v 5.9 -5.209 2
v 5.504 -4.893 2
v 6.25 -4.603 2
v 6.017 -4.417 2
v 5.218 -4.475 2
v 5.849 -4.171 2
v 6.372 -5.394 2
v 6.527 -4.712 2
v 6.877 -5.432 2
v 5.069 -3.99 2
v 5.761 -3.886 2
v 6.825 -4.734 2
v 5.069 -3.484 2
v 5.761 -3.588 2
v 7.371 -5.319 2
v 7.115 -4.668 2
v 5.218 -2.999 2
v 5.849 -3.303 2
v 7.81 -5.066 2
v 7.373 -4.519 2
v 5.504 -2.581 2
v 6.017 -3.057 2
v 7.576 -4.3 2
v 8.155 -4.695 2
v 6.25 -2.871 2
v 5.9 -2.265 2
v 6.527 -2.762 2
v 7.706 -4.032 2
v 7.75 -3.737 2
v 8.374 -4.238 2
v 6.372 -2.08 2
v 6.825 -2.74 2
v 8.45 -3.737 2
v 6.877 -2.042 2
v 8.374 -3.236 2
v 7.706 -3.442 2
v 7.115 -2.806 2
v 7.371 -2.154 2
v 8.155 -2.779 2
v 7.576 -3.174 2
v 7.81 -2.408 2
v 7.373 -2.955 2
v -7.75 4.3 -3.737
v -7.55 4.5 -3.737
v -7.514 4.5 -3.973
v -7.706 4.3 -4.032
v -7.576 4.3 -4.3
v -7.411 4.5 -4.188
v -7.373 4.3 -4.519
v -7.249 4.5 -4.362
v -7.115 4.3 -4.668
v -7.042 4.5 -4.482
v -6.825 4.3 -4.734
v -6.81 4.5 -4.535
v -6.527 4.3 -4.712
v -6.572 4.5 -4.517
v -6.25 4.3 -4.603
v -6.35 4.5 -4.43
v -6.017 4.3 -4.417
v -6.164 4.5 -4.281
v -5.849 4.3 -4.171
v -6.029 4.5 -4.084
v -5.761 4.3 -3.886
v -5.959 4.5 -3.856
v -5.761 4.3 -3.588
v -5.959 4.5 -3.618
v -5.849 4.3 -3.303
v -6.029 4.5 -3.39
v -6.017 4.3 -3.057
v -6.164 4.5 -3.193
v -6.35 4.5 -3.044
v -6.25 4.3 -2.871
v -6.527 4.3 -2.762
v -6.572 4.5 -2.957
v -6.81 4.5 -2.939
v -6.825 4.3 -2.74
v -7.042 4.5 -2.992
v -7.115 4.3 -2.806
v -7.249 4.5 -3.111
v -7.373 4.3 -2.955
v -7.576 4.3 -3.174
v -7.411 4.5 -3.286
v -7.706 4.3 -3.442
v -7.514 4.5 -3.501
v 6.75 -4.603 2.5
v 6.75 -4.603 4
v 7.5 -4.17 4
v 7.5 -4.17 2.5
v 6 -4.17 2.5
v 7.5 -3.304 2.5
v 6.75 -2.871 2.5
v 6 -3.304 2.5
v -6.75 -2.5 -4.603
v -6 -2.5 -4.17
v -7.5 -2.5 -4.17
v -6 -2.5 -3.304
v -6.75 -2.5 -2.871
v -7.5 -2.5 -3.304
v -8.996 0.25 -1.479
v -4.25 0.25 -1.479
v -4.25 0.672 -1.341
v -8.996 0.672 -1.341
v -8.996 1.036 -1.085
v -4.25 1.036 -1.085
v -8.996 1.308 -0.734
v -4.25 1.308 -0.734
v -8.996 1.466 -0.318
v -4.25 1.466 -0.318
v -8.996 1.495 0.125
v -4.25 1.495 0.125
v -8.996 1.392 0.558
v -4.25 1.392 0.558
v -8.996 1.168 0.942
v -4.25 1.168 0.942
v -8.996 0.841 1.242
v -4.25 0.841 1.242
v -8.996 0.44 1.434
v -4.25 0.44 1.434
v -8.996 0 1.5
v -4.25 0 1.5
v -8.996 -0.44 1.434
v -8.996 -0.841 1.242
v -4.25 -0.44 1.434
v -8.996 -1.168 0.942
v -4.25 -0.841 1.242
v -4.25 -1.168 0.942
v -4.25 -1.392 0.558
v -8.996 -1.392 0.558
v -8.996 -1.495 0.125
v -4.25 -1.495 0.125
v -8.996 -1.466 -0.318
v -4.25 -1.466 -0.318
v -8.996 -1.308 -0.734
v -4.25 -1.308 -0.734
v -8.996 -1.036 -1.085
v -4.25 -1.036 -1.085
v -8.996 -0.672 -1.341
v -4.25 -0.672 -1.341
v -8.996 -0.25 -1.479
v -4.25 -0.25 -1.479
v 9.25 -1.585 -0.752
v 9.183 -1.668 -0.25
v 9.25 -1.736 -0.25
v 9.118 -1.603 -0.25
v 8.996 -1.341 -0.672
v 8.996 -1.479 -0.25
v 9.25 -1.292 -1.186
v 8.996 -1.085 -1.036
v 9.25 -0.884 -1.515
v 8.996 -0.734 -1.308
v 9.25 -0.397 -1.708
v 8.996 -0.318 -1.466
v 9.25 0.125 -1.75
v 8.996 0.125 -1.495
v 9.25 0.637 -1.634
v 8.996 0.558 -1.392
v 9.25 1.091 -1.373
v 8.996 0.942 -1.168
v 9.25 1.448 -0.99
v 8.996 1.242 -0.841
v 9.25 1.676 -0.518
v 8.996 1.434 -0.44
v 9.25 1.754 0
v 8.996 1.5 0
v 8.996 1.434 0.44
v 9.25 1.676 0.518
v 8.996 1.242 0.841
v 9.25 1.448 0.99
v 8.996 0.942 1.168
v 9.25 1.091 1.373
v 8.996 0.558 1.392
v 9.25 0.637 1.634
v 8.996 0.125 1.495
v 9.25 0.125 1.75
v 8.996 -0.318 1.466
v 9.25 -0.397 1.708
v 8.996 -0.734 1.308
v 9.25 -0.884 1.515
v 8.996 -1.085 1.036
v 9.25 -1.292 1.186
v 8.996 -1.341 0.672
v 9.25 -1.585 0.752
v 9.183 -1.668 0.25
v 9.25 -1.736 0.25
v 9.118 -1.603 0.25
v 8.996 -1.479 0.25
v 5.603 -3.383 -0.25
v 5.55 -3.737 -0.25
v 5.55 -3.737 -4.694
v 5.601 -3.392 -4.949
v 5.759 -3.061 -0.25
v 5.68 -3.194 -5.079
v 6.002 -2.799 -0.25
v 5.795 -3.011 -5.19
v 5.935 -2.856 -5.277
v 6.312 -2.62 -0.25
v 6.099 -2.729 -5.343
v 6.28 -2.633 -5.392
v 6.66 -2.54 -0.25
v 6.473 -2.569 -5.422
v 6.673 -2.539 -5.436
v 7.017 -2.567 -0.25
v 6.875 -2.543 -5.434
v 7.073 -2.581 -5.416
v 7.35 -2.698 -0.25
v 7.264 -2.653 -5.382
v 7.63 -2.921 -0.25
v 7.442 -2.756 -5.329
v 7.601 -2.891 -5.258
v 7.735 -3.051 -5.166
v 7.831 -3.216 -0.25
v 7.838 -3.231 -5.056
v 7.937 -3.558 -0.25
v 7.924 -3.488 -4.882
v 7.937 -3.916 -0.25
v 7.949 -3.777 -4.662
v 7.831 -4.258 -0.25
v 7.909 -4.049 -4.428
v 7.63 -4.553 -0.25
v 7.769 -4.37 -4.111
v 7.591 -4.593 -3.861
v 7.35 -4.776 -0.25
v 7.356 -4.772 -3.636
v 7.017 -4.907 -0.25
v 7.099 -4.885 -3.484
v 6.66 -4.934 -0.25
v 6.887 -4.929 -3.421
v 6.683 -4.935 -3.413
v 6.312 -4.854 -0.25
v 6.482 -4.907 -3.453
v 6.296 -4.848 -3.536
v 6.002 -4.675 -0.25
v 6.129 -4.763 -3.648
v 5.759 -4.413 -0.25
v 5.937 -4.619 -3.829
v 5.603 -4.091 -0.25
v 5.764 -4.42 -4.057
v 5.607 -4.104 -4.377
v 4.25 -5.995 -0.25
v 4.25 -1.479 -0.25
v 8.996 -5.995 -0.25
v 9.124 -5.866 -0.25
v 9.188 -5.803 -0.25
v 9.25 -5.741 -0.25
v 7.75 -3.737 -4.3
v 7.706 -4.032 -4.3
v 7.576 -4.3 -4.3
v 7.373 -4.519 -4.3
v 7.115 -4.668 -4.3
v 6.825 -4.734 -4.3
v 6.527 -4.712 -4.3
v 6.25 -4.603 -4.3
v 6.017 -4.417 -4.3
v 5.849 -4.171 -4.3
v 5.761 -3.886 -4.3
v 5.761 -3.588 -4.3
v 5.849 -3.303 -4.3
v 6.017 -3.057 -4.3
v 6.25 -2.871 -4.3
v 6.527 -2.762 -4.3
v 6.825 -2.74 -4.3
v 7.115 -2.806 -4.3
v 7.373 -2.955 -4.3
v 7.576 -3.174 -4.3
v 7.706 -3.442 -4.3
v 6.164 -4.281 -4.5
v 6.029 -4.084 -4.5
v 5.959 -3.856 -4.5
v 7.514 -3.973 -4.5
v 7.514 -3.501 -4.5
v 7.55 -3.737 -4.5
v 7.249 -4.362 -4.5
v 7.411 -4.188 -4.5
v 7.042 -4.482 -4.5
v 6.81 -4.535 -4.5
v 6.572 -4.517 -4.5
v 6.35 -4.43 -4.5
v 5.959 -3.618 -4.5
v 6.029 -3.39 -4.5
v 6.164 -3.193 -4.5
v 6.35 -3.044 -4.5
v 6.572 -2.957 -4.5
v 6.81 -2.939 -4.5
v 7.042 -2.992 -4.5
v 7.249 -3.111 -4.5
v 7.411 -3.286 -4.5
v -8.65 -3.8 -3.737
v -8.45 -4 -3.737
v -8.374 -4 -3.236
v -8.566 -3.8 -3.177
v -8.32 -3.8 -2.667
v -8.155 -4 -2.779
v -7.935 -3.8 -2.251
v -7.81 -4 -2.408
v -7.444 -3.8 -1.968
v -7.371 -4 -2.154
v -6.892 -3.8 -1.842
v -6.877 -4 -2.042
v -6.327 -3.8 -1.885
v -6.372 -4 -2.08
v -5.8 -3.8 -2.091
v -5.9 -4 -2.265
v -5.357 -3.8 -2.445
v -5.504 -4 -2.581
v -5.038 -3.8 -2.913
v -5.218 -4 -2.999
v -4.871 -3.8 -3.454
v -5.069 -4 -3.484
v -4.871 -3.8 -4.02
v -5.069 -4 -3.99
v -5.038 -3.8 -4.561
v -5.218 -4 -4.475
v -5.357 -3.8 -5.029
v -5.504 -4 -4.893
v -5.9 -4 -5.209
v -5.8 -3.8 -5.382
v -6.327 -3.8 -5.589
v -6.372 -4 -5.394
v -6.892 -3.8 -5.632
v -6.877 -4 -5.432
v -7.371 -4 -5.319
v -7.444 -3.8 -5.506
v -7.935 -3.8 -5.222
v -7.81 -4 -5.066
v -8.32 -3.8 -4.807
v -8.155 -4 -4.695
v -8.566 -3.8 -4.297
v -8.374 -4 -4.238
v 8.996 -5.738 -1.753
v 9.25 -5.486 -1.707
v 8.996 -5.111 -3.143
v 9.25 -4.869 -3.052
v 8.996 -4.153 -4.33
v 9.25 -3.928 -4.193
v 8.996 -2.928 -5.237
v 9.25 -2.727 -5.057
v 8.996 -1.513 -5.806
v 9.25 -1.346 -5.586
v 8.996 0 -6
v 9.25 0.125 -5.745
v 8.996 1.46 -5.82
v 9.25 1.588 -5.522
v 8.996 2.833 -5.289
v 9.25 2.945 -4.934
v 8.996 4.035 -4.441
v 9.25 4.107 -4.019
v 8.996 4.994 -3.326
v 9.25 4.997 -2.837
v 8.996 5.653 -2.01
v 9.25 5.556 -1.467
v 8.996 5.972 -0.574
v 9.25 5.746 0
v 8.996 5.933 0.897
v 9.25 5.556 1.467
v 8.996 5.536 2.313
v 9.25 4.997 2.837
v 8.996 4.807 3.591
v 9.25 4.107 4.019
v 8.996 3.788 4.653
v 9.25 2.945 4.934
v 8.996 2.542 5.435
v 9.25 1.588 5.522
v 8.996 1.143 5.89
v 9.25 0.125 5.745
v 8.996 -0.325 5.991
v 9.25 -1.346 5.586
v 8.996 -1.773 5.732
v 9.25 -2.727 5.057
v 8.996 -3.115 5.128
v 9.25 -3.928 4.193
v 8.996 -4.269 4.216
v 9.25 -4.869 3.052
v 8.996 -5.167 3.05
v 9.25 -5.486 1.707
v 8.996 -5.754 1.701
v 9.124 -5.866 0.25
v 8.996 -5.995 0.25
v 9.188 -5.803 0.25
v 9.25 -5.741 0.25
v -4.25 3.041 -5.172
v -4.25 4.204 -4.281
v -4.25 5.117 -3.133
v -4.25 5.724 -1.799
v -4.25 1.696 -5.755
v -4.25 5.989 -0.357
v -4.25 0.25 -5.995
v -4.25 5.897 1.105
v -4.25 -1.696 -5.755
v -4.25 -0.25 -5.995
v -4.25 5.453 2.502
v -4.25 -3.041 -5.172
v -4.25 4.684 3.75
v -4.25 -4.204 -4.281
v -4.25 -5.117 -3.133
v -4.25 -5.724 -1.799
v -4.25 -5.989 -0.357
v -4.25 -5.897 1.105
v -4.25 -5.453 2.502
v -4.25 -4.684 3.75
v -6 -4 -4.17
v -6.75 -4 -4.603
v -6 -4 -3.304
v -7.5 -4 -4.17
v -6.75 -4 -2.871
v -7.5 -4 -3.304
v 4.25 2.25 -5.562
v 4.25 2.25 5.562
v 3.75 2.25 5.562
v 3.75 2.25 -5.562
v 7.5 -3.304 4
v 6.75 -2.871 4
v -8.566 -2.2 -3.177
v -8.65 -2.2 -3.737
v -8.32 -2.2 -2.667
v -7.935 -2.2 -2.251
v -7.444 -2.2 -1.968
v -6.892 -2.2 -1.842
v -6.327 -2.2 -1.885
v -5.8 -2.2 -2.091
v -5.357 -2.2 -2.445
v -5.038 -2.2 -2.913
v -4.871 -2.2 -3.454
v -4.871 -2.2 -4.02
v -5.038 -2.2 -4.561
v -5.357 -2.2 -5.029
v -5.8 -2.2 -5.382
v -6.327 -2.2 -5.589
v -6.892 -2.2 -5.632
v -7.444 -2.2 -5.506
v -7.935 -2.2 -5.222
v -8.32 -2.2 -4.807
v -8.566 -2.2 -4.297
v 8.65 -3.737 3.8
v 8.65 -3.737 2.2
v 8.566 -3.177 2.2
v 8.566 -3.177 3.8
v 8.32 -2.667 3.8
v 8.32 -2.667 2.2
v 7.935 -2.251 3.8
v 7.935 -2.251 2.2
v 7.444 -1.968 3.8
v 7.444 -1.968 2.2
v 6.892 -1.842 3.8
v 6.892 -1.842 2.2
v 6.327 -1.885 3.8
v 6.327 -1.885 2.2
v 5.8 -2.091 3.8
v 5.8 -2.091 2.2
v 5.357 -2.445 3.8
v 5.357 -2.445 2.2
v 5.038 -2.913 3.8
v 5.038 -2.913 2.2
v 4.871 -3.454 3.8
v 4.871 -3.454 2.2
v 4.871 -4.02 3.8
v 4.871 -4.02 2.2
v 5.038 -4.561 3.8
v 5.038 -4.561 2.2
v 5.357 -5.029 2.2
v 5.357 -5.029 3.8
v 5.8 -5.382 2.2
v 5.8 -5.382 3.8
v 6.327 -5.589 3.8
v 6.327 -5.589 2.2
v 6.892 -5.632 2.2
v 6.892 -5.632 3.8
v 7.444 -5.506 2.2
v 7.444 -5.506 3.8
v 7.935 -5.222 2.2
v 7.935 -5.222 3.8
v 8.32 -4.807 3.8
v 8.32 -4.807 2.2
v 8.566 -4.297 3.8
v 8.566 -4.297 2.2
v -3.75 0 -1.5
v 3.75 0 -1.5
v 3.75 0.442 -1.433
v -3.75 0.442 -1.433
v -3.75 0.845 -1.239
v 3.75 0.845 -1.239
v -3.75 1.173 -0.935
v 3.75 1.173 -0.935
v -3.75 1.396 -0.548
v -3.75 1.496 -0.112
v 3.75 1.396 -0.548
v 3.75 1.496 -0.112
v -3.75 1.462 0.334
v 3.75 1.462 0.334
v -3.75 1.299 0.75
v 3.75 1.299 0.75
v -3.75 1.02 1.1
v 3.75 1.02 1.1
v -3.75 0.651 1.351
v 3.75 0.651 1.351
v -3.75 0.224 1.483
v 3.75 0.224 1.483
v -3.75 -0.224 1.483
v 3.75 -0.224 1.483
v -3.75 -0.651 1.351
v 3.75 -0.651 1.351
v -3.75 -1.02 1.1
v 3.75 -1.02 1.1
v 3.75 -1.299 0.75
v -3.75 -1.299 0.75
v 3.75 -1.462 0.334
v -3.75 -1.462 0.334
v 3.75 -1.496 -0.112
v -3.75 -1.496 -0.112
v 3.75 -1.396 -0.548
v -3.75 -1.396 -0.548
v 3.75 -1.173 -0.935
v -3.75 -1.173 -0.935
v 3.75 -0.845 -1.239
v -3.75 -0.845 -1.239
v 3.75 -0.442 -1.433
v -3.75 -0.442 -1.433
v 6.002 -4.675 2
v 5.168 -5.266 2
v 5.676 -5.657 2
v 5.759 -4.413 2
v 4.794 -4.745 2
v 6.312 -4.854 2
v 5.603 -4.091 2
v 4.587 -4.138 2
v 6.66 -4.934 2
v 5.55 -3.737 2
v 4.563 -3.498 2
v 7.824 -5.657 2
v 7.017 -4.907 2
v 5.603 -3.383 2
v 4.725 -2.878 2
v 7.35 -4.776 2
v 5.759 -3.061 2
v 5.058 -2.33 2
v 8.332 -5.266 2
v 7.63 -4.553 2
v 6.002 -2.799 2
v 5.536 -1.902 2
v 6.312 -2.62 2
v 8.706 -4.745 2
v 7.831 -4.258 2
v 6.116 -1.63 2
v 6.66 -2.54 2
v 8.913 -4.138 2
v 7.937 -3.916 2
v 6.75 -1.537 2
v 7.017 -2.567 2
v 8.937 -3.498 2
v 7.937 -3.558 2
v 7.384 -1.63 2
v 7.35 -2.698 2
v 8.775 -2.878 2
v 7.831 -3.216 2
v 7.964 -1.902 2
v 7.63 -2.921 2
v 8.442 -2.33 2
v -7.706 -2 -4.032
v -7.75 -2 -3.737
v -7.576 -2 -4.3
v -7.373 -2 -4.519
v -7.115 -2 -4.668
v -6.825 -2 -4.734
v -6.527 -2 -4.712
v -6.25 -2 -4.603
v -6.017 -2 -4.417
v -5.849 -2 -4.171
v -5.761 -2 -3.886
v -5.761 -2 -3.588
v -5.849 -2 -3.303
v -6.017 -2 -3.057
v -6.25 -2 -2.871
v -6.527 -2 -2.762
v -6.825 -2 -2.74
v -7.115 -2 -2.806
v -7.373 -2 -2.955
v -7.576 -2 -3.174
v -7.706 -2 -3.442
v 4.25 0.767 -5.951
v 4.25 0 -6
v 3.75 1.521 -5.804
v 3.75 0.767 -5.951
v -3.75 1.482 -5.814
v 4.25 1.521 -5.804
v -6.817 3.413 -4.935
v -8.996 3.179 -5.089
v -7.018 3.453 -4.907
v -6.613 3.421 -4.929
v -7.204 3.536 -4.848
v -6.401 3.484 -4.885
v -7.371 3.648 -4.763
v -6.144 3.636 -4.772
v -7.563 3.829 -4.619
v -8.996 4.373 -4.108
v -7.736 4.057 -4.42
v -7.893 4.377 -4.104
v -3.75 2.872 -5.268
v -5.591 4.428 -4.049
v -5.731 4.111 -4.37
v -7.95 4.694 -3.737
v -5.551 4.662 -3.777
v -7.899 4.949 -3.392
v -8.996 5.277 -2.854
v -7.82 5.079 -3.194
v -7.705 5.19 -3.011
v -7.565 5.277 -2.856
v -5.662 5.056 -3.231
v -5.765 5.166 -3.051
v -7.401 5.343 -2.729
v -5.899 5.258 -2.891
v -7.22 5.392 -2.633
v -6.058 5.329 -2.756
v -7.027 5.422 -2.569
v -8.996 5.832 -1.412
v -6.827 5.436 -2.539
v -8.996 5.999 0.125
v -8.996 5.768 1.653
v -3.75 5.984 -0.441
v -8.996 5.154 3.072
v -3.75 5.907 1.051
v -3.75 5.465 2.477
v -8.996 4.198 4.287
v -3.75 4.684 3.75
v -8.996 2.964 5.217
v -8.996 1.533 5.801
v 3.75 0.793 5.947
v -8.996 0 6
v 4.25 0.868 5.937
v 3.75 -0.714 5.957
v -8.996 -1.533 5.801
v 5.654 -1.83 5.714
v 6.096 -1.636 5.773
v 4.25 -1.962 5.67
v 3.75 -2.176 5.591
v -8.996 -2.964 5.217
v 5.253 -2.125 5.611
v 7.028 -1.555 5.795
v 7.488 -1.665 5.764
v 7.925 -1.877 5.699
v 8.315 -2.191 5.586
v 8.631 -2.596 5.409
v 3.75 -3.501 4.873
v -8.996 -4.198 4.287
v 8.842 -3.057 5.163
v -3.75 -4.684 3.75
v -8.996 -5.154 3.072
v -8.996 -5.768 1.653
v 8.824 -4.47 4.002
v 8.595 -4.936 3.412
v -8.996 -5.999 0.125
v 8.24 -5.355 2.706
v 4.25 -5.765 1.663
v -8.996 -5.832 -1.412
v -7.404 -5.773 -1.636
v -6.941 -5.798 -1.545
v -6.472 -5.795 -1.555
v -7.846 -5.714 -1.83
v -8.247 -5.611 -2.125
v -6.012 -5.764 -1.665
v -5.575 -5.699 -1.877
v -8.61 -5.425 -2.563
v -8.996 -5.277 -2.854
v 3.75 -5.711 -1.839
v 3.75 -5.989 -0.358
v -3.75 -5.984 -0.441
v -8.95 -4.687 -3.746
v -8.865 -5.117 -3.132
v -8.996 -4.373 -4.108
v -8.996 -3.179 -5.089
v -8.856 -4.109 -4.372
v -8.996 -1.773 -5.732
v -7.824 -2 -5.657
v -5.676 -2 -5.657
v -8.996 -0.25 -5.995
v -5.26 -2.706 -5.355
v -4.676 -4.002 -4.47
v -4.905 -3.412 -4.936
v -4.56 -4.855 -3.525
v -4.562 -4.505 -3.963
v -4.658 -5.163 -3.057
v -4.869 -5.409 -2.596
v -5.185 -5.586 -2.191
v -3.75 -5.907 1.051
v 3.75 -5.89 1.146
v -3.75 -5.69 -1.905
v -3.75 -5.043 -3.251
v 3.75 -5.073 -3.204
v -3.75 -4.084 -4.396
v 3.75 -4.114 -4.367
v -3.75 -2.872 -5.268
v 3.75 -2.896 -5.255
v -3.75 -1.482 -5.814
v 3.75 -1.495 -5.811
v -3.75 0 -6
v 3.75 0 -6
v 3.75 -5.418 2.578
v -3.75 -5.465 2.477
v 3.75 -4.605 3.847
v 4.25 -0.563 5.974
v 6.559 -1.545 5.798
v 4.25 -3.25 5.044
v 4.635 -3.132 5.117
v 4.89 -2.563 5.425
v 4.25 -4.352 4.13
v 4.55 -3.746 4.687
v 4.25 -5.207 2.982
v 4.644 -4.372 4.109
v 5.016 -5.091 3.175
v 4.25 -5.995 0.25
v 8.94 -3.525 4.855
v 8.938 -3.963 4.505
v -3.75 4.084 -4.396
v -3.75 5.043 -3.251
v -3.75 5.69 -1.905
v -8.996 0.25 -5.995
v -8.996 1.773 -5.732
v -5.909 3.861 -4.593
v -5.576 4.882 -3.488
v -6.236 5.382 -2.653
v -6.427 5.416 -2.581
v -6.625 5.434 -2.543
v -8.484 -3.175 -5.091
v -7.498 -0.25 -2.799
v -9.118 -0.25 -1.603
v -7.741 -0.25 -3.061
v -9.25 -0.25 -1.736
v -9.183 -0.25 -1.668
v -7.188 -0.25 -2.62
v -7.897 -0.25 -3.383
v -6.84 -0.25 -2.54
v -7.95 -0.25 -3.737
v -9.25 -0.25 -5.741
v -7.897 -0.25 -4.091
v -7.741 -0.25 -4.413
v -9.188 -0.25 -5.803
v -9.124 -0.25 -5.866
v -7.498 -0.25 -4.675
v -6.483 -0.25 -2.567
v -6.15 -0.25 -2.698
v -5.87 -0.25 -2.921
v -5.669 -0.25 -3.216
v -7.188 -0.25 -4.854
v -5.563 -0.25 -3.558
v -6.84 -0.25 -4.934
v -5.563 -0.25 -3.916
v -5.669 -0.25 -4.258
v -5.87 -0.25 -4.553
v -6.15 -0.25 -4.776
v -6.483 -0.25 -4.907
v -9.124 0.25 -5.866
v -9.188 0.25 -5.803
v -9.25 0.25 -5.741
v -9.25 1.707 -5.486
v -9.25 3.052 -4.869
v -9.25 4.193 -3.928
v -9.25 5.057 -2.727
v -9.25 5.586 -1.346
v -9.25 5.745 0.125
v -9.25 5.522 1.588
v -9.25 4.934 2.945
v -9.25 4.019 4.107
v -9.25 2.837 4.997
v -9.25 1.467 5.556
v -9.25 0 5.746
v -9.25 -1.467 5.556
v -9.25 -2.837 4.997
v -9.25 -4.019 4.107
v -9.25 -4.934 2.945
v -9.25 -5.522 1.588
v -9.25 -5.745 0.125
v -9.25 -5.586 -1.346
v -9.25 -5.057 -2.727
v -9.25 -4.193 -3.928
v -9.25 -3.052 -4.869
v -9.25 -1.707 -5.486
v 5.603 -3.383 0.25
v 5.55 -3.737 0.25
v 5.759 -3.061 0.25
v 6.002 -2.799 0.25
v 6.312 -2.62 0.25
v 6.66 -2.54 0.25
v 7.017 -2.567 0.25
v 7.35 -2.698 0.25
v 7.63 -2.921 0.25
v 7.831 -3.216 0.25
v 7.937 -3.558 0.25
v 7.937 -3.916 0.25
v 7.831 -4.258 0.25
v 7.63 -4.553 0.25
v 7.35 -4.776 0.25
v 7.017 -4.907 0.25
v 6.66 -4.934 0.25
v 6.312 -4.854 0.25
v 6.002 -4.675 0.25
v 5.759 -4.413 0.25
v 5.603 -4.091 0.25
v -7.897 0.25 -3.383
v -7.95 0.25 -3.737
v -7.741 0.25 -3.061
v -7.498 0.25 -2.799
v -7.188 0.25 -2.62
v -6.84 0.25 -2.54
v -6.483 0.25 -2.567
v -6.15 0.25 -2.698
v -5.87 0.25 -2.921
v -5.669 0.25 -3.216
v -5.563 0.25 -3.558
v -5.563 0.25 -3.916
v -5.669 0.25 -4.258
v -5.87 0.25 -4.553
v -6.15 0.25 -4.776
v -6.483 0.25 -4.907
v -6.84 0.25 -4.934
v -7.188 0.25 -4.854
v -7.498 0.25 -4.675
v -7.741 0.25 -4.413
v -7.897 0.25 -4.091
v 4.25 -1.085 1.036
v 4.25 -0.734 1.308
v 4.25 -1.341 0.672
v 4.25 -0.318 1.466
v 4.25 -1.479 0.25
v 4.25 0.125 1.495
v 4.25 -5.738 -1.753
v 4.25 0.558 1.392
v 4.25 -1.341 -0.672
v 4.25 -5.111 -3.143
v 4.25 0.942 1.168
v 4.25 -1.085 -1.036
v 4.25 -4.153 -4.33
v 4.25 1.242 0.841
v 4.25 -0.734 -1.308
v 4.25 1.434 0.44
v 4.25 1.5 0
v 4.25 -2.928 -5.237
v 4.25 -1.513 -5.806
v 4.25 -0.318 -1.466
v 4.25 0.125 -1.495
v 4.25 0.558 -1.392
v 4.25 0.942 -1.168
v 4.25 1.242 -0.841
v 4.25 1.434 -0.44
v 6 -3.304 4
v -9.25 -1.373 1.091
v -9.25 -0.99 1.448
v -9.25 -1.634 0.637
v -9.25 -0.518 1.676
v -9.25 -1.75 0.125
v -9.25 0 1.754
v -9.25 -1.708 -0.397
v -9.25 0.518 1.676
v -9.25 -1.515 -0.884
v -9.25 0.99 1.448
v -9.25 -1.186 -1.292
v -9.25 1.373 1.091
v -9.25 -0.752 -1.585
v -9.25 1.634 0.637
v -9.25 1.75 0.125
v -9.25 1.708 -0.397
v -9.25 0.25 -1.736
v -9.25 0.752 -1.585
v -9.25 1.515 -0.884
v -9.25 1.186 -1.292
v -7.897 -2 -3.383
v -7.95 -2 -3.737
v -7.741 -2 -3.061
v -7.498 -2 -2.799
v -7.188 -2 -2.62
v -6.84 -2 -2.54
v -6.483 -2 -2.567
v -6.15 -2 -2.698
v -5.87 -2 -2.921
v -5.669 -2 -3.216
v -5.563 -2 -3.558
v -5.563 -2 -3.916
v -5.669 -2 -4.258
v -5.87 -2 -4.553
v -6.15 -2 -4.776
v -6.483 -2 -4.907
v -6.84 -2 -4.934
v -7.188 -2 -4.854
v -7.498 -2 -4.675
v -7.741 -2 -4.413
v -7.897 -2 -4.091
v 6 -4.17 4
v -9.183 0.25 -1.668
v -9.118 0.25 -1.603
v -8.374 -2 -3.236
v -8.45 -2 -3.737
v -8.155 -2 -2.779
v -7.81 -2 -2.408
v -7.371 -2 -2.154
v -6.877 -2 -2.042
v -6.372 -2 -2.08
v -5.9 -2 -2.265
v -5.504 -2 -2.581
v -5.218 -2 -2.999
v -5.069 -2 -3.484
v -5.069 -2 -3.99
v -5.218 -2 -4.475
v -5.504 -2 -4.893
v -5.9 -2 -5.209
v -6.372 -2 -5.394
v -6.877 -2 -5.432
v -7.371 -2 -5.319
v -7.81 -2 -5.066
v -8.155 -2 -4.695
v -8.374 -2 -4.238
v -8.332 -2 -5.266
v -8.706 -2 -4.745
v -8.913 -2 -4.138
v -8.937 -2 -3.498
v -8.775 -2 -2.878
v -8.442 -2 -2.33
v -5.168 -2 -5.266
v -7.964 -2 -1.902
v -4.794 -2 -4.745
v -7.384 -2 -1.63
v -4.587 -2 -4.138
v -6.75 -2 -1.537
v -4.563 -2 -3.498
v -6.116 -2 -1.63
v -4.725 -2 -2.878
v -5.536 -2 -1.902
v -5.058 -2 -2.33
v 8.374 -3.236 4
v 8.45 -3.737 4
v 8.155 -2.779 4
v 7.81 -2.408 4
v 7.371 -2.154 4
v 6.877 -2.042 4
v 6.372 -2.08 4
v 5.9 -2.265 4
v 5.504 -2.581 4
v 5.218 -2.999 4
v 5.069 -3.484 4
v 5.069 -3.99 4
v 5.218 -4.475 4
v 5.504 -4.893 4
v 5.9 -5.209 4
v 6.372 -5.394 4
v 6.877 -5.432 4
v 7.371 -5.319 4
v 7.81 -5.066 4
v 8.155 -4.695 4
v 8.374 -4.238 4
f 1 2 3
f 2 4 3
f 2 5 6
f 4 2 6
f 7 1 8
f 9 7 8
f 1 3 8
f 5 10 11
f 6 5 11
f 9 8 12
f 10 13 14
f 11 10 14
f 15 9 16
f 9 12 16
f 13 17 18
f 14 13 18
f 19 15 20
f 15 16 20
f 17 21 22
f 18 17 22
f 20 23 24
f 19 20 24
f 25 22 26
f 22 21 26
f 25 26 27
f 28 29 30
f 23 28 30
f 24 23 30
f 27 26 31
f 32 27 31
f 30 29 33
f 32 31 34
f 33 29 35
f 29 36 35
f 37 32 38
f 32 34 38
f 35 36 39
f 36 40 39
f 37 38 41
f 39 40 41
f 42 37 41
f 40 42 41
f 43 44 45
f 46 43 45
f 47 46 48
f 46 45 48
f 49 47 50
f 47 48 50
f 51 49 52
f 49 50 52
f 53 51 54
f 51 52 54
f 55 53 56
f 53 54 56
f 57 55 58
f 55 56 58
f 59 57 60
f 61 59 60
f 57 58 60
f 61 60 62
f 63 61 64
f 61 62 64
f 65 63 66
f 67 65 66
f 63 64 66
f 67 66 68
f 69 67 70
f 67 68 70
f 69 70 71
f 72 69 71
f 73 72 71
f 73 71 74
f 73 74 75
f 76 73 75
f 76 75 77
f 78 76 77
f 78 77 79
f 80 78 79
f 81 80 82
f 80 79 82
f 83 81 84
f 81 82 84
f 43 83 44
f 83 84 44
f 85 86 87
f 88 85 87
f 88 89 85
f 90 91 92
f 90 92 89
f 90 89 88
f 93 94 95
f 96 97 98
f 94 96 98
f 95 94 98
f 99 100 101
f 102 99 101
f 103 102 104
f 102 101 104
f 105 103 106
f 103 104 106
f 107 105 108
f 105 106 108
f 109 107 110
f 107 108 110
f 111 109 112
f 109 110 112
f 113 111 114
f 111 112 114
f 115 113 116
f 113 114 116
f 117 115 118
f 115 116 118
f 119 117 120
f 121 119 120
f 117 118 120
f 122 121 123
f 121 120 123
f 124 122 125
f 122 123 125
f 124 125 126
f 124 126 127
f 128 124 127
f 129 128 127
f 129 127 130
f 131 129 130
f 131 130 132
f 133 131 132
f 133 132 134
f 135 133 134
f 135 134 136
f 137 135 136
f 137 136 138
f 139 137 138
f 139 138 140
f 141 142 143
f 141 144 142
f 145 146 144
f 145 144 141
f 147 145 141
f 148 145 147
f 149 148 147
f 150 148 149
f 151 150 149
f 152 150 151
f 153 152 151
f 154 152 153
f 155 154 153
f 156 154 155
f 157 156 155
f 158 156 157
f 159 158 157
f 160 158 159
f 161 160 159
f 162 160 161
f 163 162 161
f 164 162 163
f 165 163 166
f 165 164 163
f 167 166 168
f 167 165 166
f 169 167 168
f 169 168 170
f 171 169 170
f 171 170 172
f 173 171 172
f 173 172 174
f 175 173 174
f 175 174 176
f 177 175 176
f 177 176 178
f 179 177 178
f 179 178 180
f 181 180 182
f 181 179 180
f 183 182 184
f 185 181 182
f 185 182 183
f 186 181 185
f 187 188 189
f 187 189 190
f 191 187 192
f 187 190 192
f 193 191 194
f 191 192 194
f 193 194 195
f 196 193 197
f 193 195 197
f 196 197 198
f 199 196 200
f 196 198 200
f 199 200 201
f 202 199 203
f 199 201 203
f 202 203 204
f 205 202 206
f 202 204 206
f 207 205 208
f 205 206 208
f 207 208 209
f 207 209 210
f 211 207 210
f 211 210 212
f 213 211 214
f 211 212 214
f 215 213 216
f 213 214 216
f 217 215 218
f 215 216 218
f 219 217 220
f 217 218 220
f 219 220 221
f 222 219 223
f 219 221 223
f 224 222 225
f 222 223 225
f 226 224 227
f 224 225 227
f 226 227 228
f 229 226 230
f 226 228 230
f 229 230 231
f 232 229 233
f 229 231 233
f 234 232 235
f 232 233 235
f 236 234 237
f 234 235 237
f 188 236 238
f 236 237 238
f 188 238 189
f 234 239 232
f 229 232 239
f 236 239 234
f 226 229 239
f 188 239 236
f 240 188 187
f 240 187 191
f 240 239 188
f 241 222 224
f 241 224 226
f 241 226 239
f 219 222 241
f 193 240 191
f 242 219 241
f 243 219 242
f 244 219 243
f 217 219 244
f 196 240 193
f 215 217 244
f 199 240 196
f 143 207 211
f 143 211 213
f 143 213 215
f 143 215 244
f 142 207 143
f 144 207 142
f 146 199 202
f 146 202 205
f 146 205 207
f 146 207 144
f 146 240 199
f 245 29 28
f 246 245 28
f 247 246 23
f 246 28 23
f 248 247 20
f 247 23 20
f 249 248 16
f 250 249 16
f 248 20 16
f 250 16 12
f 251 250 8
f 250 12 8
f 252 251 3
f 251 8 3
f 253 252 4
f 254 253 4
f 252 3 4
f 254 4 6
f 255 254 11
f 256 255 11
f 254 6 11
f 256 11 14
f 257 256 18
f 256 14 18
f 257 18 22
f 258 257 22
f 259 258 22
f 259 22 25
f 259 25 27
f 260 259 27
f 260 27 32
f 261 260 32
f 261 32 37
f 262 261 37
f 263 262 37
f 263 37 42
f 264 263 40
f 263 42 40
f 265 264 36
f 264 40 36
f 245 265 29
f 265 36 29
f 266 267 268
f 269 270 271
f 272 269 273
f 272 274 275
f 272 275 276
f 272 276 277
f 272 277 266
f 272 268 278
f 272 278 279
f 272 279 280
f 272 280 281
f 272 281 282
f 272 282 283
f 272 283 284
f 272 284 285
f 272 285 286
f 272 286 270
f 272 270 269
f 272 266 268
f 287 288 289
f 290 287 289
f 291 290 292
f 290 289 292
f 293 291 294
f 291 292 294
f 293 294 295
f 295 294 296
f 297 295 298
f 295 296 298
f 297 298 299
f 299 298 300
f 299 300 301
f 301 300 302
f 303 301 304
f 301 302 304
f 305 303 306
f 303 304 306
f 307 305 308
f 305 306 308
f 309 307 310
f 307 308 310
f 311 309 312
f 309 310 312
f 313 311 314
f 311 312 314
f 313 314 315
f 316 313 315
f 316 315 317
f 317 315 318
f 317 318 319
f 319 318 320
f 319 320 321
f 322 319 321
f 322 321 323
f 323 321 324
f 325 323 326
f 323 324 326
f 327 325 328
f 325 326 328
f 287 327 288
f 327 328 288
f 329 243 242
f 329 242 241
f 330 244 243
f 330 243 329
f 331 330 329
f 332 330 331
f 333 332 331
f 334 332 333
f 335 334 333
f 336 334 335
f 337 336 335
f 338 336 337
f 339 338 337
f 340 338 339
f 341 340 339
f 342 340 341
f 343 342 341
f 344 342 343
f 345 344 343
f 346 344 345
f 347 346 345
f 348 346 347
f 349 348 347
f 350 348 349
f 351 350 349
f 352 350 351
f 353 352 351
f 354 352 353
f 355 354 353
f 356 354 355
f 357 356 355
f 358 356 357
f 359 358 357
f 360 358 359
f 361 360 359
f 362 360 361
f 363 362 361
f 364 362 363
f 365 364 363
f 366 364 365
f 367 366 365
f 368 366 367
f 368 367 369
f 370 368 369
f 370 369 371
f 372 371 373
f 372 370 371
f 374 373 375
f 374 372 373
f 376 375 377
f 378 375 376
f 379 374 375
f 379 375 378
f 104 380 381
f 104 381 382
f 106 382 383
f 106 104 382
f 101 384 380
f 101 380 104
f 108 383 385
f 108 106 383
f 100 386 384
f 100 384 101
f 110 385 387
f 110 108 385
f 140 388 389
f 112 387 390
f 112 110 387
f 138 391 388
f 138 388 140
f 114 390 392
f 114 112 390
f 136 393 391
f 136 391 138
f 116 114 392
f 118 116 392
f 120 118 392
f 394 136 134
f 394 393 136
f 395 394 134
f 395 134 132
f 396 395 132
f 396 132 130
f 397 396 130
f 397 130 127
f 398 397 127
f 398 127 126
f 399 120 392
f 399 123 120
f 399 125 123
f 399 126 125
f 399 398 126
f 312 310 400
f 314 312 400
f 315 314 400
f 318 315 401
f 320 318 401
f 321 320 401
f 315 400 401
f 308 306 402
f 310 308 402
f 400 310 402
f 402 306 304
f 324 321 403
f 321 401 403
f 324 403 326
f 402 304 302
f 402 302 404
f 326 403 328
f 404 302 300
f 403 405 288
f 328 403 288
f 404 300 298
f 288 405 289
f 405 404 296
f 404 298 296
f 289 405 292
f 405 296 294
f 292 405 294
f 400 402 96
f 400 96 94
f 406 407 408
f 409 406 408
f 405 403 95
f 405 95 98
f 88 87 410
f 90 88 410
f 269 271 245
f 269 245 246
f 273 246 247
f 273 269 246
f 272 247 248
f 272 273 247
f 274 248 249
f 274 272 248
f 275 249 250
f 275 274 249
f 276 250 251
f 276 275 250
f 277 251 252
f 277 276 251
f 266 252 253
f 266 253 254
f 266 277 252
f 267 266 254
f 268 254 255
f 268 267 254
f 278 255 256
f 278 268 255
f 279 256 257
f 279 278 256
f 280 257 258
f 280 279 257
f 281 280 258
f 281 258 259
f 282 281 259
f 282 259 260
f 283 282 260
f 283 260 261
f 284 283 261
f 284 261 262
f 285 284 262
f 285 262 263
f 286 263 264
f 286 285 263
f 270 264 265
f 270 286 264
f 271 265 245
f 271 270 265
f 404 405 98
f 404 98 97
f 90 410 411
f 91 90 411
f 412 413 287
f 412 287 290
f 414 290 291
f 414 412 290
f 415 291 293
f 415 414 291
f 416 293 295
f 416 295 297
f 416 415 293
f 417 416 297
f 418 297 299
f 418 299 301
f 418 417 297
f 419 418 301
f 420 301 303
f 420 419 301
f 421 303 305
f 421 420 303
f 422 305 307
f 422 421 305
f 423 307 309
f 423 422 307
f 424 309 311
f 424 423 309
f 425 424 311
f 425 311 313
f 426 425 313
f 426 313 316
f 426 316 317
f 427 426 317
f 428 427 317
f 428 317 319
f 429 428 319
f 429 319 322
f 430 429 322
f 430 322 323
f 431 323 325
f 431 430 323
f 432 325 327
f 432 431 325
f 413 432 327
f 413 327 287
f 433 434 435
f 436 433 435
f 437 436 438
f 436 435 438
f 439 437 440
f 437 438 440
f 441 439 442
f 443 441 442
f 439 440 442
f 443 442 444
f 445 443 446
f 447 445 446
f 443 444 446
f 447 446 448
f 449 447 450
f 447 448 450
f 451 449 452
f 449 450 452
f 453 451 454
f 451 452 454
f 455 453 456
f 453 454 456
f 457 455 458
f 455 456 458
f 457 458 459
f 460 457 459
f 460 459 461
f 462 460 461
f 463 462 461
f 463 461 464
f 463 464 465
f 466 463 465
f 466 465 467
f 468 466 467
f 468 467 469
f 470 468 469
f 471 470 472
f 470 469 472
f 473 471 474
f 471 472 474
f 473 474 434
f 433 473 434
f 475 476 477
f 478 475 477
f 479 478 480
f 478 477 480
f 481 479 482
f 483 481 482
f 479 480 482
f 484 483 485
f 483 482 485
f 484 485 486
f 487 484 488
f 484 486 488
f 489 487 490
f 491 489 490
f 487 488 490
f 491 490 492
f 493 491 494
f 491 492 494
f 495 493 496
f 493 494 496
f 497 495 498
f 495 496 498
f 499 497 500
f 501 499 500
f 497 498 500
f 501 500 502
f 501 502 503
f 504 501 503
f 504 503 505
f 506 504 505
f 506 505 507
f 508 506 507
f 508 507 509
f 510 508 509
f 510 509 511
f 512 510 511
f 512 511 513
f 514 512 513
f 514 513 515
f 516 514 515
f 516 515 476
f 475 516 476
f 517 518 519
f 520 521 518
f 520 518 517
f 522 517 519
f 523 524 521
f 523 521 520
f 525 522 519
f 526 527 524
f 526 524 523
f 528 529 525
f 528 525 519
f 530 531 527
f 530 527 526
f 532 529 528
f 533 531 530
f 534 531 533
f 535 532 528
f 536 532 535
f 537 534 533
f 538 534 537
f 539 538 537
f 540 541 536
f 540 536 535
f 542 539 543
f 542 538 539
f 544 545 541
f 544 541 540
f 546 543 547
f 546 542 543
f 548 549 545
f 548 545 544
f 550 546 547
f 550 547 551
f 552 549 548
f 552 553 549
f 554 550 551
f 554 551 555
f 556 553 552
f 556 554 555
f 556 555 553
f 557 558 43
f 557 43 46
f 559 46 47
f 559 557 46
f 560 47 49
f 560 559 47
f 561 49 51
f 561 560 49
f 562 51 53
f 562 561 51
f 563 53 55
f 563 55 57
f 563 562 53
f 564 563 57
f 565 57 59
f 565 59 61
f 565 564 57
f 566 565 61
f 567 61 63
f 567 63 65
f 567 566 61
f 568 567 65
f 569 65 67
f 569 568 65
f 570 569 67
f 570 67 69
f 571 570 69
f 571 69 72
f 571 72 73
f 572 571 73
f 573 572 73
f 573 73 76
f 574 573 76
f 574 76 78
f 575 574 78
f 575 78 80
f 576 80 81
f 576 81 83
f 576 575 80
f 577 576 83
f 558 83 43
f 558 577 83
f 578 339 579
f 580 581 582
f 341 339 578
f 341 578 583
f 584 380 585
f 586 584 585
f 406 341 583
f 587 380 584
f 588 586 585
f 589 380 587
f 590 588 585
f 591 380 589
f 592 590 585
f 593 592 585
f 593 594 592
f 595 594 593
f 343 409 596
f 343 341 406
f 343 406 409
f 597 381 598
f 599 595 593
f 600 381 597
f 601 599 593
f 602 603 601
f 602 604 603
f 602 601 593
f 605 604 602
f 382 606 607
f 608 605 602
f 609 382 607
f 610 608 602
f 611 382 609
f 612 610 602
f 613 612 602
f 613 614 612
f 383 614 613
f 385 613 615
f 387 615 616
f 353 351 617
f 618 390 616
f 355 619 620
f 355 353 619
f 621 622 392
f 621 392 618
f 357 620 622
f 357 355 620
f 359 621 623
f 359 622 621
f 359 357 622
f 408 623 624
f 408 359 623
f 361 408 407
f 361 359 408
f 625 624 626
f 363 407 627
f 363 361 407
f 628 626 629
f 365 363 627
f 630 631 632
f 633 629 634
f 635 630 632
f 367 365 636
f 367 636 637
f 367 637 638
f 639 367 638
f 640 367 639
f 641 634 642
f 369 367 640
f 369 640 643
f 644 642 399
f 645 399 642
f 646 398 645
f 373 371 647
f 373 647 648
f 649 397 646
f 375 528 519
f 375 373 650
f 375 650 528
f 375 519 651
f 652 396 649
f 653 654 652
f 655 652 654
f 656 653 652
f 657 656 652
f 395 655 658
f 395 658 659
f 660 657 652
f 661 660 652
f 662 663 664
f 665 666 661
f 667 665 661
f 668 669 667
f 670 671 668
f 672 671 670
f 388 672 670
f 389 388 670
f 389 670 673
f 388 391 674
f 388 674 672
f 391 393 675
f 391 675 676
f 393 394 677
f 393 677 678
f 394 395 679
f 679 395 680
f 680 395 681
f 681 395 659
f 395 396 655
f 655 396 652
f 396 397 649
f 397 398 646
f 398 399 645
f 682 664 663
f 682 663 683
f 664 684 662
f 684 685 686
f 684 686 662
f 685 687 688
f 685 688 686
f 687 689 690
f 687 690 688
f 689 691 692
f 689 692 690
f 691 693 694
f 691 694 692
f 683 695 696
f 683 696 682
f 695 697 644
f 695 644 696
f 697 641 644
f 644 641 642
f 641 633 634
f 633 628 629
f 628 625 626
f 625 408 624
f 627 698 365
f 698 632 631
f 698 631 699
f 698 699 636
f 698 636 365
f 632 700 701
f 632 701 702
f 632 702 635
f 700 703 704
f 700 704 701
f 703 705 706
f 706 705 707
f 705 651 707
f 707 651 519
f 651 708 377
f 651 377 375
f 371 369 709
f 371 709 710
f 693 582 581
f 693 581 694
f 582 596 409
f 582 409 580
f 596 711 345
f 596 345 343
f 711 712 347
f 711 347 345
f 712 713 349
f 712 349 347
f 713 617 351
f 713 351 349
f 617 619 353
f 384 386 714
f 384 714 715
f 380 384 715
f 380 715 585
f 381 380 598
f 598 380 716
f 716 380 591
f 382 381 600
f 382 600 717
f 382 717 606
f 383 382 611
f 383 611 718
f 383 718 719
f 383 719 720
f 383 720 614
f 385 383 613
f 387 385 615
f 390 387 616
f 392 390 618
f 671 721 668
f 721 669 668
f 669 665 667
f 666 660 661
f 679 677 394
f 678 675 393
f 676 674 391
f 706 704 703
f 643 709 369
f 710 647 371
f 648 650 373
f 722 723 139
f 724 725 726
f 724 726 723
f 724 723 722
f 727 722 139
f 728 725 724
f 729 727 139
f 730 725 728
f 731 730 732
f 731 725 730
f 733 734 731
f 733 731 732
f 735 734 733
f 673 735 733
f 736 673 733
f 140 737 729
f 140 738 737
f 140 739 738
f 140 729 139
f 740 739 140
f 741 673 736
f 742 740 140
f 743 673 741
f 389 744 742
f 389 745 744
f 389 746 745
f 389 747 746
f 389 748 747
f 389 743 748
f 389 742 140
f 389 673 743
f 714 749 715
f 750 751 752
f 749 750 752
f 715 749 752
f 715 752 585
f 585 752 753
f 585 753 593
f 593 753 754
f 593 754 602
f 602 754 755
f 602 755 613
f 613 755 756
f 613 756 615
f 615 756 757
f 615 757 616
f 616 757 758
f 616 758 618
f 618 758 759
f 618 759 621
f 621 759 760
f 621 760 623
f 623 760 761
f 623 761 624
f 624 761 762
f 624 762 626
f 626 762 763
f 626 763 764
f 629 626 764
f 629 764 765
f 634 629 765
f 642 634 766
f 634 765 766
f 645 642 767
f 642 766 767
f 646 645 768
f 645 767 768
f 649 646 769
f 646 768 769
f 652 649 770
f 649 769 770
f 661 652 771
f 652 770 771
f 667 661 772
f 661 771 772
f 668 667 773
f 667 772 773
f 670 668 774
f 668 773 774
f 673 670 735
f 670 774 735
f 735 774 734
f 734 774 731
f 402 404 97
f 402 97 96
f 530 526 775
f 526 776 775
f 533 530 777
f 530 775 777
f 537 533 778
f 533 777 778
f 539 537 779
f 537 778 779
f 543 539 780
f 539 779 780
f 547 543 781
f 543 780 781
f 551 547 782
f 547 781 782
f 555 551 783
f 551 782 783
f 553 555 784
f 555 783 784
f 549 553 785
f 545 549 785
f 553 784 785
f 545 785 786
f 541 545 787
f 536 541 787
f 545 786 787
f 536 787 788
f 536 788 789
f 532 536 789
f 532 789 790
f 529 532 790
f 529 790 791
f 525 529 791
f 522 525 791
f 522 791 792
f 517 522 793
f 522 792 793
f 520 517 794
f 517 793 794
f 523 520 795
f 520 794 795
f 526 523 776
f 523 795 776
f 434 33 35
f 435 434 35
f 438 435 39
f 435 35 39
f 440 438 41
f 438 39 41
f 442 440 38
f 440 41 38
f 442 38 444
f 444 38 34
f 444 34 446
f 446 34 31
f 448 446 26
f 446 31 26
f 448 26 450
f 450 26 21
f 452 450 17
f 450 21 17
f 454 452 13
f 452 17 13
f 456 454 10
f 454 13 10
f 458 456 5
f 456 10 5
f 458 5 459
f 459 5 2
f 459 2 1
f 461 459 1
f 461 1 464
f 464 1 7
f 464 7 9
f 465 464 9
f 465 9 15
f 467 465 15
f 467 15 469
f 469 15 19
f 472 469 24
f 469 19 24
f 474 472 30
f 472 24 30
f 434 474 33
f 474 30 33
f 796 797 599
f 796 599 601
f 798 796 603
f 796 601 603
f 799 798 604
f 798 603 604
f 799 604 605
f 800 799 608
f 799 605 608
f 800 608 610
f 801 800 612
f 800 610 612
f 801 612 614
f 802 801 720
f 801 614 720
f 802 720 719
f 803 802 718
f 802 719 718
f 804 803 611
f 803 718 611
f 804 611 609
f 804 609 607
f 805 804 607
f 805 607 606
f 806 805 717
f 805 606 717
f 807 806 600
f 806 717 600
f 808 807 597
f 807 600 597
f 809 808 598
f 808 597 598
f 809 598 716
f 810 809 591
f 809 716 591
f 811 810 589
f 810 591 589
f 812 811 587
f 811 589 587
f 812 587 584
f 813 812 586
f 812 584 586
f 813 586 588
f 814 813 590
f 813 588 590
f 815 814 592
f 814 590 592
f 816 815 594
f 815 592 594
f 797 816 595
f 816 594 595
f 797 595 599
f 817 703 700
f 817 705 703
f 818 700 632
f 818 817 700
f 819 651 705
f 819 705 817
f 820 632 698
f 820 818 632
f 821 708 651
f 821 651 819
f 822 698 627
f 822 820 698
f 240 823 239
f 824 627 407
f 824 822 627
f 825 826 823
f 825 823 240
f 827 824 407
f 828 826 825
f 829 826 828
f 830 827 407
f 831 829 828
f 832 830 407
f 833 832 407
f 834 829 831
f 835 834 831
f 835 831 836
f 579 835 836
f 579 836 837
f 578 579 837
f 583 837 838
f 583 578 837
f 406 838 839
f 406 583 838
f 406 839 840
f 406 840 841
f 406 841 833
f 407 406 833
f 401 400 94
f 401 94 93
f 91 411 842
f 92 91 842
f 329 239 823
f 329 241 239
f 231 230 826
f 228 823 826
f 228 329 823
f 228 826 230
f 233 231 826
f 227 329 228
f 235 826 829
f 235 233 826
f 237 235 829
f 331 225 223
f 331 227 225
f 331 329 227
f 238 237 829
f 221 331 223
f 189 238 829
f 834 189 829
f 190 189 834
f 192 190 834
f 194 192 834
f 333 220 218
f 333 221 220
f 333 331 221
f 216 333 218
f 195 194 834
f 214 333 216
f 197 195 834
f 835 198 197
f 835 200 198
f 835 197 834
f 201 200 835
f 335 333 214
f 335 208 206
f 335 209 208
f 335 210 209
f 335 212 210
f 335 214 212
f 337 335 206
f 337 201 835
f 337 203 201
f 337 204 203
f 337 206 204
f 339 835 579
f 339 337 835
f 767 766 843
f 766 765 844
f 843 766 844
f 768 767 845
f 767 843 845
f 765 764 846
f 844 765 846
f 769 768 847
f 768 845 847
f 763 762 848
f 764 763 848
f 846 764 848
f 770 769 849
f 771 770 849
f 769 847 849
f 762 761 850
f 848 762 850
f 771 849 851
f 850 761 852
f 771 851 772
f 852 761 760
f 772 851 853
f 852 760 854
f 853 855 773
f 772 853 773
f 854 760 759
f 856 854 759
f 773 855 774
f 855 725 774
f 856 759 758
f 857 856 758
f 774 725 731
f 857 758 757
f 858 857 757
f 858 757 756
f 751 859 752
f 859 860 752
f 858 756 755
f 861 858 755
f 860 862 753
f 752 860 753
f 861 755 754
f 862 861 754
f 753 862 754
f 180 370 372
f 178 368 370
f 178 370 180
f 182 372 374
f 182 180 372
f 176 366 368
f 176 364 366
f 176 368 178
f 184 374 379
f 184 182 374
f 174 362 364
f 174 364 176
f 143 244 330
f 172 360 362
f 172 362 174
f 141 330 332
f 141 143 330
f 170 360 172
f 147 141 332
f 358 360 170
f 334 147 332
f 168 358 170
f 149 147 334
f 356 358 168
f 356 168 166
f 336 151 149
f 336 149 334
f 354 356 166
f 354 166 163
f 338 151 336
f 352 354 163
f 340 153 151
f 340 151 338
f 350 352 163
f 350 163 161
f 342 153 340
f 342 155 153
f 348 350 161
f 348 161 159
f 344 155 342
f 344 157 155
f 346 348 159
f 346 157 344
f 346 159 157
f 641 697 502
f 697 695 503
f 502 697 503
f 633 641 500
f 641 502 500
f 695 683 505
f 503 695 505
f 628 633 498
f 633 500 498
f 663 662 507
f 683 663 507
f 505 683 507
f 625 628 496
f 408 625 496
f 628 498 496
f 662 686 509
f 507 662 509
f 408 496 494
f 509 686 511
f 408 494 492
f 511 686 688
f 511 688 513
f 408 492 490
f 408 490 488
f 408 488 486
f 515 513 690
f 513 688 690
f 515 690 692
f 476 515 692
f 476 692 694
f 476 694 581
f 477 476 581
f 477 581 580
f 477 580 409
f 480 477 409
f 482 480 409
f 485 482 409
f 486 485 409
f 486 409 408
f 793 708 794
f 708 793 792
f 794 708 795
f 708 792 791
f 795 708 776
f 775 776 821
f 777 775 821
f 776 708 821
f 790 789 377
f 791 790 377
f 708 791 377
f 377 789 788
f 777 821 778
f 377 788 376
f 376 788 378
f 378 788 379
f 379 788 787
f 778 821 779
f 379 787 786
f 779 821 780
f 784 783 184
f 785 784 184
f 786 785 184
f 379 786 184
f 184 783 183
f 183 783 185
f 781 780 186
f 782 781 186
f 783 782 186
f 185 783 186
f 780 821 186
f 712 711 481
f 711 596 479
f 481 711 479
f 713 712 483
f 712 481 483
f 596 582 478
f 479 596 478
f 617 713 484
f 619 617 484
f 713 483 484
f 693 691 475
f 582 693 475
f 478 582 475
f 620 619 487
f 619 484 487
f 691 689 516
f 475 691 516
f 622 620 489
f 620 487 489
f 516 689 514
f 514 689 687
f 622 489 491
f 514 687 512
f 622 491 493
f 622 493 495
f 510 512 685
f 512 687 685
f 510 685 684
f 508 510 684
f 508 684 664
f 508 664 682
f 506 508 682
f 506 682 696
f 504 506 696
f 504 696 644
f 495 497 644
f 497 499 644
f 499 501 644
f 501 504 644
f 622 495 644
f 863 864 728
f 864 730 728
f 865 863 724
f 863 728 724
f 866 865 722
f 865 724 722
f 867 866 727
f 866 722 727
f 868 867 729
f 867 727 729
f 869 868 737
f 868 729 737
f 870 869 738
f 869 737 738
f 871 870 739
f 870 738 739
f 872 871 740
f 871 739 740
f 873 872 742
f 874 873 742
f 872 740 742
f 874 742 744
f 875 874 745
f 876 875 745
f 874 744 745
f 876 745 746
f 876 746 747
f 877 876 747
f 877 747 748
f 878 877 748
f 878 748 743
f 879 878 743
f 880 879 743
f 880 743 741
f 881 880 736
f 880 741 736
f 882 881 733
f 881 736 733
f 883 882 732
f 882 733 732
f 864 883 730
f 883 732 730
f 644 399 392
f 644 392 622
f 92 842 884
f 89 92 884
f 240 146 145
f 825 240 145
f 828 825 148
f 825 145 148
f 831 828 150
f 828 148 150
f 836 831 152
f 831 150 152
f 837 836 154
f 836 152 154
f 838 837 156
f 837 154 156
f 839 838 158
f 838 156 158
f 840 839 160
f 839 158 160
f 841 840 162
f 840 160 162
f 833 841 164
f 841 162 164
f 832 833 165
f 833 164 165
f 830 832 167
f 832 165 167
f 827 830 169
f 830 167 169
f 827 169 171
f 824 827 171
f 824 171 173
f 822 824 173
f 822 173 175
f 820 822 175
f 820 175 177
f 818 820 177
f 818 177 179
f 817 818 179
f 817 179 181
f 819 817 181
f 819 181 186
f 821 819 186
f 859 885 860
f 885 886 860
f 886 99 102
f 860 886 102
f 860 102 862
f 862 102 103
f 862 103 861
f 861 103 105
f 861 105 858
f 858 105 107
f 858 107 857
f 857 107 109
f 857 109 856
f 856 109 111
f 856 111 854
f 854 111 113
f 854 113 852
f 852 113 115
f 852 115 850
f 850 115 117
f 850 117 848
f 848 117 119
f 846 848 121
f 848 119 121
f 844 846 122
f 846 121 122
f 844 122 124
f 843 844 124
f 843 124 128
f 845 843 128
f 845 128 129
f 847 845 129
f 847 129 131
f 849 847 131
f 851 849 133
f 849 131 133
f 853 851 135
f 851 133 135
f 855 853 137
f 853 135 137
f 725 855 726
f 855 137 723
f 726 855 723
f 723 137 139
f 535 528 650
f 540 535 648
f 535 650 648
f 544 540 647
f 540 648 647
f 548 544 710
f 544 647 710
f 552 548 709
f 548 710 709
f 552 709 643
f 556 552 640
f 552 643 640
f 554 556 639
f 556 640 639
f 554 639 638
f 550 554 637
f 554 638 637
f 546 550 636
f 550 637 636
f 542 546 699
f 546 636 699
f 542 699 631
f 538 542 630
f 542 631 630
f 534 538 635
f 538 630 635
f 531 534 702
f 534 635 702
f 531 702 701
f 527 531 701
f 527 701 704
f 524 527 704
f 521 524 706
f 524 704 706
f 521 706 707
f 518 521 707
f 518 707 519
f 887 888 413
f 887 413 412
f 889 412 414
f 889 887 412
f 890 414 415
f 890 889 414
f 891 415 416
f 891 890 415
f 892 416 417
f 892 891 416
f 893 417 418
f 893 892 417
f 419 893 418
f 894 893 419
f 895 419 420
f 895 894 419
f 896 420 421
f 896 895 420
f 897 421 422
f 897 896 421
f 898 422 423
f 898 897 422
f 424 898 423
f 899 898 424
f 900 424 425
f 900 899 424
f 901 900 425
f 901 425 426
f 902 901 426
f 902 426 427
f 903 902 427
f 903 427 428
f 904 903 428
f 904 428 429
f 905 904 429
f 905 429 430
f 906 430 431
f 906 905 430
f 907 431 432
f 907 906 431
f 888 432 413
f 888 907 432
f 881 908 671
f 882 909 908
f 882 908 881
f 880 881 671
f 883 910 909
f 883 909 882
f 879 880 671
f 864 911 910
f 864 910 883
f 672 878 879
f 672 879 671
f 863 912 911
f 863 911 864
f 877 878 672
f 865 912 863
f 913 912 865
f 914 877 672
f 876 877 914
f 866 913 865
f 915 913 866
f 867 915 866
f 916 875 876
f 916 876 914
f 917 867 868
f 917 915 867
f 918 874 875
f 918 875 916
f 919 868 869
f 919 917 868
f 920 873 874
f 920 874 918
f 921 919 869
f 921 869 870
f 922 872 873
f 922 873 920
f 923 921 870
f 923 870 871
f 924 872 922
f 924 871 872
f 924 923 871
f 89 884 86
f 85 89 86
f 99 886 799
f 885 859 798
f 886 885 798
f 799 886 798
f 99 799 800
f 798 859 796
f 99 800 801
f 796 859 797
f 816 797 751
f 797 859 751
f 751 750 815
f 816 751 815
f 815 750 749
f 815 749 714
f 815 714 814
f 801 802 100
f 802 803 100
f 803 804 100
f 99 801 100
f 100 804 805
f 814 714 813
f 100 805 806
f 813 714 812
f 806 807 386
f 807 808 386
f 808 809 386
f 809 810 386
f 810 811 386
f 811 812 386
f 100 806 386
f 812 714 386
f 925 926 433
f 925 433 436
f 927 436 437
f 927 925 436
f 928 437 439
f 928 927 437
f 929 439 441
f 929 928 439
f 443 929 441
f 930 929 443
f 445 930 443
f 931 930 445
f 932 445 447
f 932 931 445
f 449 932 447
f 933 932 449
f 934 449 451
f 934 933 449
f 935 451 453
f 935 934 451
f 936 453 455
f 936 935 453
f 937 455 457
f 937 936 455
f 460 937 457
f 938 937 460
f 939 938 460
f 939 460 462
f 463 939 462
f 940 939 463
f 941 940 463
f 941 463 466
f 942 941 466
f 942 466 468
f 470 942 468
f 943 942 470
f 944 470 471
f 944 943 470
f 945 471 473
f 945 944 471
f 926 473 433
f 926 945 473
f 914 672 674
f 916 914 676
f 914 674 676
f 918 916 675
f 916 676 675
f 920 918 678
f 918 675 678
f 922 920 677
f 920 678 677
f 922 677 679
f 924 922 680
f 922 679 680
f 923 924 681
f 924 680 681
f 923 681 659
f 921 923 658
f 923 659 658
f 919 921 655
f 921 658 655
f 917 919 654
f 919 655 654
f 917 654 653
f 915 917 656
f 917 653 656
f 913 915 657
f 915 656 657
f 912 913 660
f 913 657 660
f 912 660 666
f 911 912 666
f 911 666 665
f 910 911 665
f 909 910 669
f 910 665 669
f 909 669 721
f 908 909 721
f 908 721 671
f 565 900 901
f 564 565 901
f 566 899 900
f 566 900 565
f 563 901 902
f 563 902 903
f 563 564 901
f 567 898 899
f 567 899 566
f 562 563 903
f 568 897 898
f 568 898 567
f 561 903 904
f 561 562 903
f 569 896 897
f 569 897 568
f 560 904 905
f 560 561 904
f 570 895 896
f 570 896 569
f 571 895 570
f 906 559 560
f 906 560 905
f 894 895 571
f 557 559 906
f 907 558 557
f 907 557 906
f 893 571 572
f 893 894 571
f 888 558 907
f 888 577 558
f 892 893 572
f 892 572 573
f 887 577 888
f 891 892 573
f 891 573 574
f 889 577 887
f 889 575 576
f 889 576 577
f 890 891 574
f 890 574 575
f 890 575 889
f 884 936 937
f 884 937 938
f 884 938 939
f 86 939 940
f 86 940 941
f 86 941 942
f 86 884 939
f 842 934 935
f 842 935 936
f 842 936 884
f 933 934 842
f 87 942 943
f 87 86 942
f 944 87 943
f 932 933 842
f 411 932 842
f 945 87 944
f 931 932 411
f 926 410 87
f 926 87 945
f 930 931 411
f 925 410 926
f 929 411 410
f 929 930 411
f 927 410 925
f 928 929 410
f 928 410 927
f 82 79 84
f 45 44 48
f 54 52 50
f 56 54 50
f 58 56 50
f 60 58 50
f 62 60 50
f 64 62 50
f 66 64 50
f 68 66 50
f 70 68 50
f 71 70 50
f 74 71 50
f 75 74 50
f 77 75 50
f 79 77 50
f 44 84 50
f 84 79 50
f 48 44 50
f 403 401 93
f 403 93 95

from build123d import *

# Parameters (mm, degrees)
SKETCH1_R                      = 6
BOSS_EXTRUDE1_DEPTH            = 9.25
SKETCH2_R                      = 1.5
CUT_EXTRUDE1_DEPTH             = 19.5
CHAMFER1_SIZE                  = 0.254
SKETCH4_W                      = 0.5
SKETCH4_H                      = 9.75
CUT_EXTRUDE2_DEPTH             = 13
SKETCH7_W                      = 0.5
SKETCH7_H                      = 8.25
CUT_EXTRUDE3_DEPTH             = 13
SKETCH8_W                      = 5
SKETCH8_H                      = 6
CUT_EXTRUDE5_DEPTH             = 0.25
SKETCH13_W                     = 5
SKETCH13_H                     = 6
CUT_EXTRUDE6_DEPTH             = 0.25
CBORE_FOR_M2_SHCS1_D           = 2.4
CBORE_FOR_M2_SHCS1_CBORE_D     = 4.4
CBORE_FOR_M2_SHCS1_CBORE_DEPTH = 4
CBORE_FOR_M2_SHCS2_D           = 2.4
CBORE_FOR_M2_SHCS2_CBORE_D     = 4.4
CBORE_FOR_M2_SHCS2_CBORE_DEPTH = 4
SKETCH16_R                     = 1.9
BOSS_EXTRUDE2_DEPTH            = 2
SKETCH17_R                     = 1
BOSS_EXTRUDE3_DEPTH            = 6.5
CHAMFER2_SIZE                  = 0.2
CUT_EXTRUDE7_DEPTH             = 1.5
CIRPATTERN1_COUNT              = 2
CIRPATTERN1_ANGLE              = 90


with BuildPart() as part:
    # Sketch1 → Boss-Extrude1 (new body, symmetric)
    with BuildSketch(Plane(origin=(0, 0, 0), x_dir=(0, 0, -1), z_dir=(1, 0, 0))):
        Circle(SKETCH1_R)
    extrude(amount=BOSS_EXTRUDE1_DEPTH, both=True)

    # Sketch2 → Cut-Extrude1 (cut, through all)
    with BuildSketch(Plane(origin=(9.25, 0, 0), x_dir=(0, 0, -1), z_dir=(1, 0, 0))):
        Circle(SKETCH2_R)
    extrude(amount=-CUT_EXTRUDE1_DEPTH, mode=Mode.SUBTRACT)

    # Chamfer1
    chamfer1_edges = [part.edges().sort_by_distance(p)[0] for p in [
        (-9.25, 0, 6),
        (9.25, 0, 6),
        (-9.25, 0, 1.5),
        (9.25, 0, 1.5),
    ]]
    chamfer(chamfer1_edges, length=CHAMFER1_SIZE)

    # Sketch4 → Cut-Extrude2 (cut, through all)
    with BuildSketch(Plane.XZ.offset(6)):
        with Locations((-4, -1.125)):
            Rectangle(SKETCH4_W, SKETCH4_H)
    extrude(amount=-CUT_EXTRUDE2_DEPTH, mode=Mode.SUBTRACT)

    # Sketch7 → Cut-Extrude3 (cut, through all)
    with BuildSketch(Plane(origin=(0, 0, -6), x_dir=(-1, 0, 0), z_dir=(0, 0, -1))):
        with Locations((-4, -1.875)):
            Rectangle(SKETCH7_W, SKETCH7_H)
    extrude(amount=-CUT_EXTRUDE3_DEPTH, mode=Mode.SUBTRACT)

    # Sketch8 → Cut-Extrude5 (cut, symmetric)
    with BuildSketch(Plane(origin=(0, 0, 0), x_dir=(1, 0, 0), z_dir=(0, 1, 0))):
        with Locations((-6.75, 3)):
            Rectangle(SKETCH8_W, SKETCH8_H)
    extrude(amount=CUT_EXTRUDE5_DEPTH, both=True, mode=Mode.SUBTRACT)

    # Sketch13 → Cut-Extrude6 (cut, symmetric)
    with BuildSketch(Plane.XY):
        with Locations((6.75, -3)):
            Rectangle(SKETCH13_W, SKETCH13_H)
    extrude(amount=CUT_EXTRUDE6_DEPTH, both=True, mode=Mode.SUBTRACT)

    # CBORE for M2 SHCS1 (through all)
    with Locations(Plane.XZ.offset(6)):
        with Locations((-6.75, -3.736904675)):
            CounterBoreHole(CBORE_FOR_M2_SHCS1_D / 2, CBORE_FOR_M2_SHCS1_CBORE_D / 2, CBORE_FOR_M2_SHCS1_CBORE_DEPTH)

    # CBORE for M2 SHCS2 (through all)
    with Locations(Plane.XY.offset(6)):
        with Locations((6.75, -3.736904675)):
            CounterBoreHole(CBORE_FOR_M2_SHCS2_D / 2, CBORE_FOR_M2_SHCS2_CBORE_D / 2, CBORE_FOR_M2_SHCS2_CBORE_DEPTH)


with BuildPart() as body_2:
    # Sketch16 → Boss-Extrude2 (new body)
    with BuildSketch(Plane.XY.offset(2)):
        with Locations((6.75, -3.736904675)):
            Circle(SKETCH16_R)
    extrude(amount=BOSS_EXTRUDE2_DEPTH)

    # Sketch17 → Boss-Extrude3 (add)
    with BuildSketch(Plane(origin=(0, 0, 2), x_dir=(-1, 0, 0), z_dir=(0, 0, -1))):
        with Locations(Location((-6.75, -3.736904675, 0), (0, 0, 180))):  # turned: the seam where the file's is
            Circle(SKETCH17_R)
    extrude(amount=BOSS_EXTRUDE3_DEPTH)

    # Chamfer2
    chamfer2_edges = [body_2.edges().sort_by_distance(p)[0] for p in [
        (4.85, -3.736904675, 2),
        (4.85, -3.736904675, 4),
        (5.75, -3.736904675, -4.5),
    ]]
    chamfer(chamfer2_edges, length=CHAMFER2_SIZE)

    # Sketch18 → Cut-Extrude7 (cut)
    with BuildSketch(Plane.XY.offset(4)):
        Polygon((6.75, -4.602930079), (7.5, -4.169917377), (7.5, -3.303891973), (6.75, -2.870879271), (6, -3.303891973), (6, -4.169917377), align=None)
    extrude(amount=-CUT_EXTRUDE7_DEPTH, mode=Mode.SUBTRACT)


with BuildPart() as body_3:
    # Mirror1: mirrored copy
    add(body_2.part.mirror(Plane(origin=(0, 0, 0), x_dir=(0, 0, 1), z_dir=(1, 0, 0))))


with BuildPart() as cirpattern1_1:
    # CirPattern1: pattern copy
    add(body_3.part.rotate(Axis((0, 0, 0), (1, 0, 0)), 1 * CIRPATTERN1_ANGLE / (CIRPATTERN1_COUNT - 1)))


solid = Compound([part.part, body_2.part, cirpattern1_1.part])
